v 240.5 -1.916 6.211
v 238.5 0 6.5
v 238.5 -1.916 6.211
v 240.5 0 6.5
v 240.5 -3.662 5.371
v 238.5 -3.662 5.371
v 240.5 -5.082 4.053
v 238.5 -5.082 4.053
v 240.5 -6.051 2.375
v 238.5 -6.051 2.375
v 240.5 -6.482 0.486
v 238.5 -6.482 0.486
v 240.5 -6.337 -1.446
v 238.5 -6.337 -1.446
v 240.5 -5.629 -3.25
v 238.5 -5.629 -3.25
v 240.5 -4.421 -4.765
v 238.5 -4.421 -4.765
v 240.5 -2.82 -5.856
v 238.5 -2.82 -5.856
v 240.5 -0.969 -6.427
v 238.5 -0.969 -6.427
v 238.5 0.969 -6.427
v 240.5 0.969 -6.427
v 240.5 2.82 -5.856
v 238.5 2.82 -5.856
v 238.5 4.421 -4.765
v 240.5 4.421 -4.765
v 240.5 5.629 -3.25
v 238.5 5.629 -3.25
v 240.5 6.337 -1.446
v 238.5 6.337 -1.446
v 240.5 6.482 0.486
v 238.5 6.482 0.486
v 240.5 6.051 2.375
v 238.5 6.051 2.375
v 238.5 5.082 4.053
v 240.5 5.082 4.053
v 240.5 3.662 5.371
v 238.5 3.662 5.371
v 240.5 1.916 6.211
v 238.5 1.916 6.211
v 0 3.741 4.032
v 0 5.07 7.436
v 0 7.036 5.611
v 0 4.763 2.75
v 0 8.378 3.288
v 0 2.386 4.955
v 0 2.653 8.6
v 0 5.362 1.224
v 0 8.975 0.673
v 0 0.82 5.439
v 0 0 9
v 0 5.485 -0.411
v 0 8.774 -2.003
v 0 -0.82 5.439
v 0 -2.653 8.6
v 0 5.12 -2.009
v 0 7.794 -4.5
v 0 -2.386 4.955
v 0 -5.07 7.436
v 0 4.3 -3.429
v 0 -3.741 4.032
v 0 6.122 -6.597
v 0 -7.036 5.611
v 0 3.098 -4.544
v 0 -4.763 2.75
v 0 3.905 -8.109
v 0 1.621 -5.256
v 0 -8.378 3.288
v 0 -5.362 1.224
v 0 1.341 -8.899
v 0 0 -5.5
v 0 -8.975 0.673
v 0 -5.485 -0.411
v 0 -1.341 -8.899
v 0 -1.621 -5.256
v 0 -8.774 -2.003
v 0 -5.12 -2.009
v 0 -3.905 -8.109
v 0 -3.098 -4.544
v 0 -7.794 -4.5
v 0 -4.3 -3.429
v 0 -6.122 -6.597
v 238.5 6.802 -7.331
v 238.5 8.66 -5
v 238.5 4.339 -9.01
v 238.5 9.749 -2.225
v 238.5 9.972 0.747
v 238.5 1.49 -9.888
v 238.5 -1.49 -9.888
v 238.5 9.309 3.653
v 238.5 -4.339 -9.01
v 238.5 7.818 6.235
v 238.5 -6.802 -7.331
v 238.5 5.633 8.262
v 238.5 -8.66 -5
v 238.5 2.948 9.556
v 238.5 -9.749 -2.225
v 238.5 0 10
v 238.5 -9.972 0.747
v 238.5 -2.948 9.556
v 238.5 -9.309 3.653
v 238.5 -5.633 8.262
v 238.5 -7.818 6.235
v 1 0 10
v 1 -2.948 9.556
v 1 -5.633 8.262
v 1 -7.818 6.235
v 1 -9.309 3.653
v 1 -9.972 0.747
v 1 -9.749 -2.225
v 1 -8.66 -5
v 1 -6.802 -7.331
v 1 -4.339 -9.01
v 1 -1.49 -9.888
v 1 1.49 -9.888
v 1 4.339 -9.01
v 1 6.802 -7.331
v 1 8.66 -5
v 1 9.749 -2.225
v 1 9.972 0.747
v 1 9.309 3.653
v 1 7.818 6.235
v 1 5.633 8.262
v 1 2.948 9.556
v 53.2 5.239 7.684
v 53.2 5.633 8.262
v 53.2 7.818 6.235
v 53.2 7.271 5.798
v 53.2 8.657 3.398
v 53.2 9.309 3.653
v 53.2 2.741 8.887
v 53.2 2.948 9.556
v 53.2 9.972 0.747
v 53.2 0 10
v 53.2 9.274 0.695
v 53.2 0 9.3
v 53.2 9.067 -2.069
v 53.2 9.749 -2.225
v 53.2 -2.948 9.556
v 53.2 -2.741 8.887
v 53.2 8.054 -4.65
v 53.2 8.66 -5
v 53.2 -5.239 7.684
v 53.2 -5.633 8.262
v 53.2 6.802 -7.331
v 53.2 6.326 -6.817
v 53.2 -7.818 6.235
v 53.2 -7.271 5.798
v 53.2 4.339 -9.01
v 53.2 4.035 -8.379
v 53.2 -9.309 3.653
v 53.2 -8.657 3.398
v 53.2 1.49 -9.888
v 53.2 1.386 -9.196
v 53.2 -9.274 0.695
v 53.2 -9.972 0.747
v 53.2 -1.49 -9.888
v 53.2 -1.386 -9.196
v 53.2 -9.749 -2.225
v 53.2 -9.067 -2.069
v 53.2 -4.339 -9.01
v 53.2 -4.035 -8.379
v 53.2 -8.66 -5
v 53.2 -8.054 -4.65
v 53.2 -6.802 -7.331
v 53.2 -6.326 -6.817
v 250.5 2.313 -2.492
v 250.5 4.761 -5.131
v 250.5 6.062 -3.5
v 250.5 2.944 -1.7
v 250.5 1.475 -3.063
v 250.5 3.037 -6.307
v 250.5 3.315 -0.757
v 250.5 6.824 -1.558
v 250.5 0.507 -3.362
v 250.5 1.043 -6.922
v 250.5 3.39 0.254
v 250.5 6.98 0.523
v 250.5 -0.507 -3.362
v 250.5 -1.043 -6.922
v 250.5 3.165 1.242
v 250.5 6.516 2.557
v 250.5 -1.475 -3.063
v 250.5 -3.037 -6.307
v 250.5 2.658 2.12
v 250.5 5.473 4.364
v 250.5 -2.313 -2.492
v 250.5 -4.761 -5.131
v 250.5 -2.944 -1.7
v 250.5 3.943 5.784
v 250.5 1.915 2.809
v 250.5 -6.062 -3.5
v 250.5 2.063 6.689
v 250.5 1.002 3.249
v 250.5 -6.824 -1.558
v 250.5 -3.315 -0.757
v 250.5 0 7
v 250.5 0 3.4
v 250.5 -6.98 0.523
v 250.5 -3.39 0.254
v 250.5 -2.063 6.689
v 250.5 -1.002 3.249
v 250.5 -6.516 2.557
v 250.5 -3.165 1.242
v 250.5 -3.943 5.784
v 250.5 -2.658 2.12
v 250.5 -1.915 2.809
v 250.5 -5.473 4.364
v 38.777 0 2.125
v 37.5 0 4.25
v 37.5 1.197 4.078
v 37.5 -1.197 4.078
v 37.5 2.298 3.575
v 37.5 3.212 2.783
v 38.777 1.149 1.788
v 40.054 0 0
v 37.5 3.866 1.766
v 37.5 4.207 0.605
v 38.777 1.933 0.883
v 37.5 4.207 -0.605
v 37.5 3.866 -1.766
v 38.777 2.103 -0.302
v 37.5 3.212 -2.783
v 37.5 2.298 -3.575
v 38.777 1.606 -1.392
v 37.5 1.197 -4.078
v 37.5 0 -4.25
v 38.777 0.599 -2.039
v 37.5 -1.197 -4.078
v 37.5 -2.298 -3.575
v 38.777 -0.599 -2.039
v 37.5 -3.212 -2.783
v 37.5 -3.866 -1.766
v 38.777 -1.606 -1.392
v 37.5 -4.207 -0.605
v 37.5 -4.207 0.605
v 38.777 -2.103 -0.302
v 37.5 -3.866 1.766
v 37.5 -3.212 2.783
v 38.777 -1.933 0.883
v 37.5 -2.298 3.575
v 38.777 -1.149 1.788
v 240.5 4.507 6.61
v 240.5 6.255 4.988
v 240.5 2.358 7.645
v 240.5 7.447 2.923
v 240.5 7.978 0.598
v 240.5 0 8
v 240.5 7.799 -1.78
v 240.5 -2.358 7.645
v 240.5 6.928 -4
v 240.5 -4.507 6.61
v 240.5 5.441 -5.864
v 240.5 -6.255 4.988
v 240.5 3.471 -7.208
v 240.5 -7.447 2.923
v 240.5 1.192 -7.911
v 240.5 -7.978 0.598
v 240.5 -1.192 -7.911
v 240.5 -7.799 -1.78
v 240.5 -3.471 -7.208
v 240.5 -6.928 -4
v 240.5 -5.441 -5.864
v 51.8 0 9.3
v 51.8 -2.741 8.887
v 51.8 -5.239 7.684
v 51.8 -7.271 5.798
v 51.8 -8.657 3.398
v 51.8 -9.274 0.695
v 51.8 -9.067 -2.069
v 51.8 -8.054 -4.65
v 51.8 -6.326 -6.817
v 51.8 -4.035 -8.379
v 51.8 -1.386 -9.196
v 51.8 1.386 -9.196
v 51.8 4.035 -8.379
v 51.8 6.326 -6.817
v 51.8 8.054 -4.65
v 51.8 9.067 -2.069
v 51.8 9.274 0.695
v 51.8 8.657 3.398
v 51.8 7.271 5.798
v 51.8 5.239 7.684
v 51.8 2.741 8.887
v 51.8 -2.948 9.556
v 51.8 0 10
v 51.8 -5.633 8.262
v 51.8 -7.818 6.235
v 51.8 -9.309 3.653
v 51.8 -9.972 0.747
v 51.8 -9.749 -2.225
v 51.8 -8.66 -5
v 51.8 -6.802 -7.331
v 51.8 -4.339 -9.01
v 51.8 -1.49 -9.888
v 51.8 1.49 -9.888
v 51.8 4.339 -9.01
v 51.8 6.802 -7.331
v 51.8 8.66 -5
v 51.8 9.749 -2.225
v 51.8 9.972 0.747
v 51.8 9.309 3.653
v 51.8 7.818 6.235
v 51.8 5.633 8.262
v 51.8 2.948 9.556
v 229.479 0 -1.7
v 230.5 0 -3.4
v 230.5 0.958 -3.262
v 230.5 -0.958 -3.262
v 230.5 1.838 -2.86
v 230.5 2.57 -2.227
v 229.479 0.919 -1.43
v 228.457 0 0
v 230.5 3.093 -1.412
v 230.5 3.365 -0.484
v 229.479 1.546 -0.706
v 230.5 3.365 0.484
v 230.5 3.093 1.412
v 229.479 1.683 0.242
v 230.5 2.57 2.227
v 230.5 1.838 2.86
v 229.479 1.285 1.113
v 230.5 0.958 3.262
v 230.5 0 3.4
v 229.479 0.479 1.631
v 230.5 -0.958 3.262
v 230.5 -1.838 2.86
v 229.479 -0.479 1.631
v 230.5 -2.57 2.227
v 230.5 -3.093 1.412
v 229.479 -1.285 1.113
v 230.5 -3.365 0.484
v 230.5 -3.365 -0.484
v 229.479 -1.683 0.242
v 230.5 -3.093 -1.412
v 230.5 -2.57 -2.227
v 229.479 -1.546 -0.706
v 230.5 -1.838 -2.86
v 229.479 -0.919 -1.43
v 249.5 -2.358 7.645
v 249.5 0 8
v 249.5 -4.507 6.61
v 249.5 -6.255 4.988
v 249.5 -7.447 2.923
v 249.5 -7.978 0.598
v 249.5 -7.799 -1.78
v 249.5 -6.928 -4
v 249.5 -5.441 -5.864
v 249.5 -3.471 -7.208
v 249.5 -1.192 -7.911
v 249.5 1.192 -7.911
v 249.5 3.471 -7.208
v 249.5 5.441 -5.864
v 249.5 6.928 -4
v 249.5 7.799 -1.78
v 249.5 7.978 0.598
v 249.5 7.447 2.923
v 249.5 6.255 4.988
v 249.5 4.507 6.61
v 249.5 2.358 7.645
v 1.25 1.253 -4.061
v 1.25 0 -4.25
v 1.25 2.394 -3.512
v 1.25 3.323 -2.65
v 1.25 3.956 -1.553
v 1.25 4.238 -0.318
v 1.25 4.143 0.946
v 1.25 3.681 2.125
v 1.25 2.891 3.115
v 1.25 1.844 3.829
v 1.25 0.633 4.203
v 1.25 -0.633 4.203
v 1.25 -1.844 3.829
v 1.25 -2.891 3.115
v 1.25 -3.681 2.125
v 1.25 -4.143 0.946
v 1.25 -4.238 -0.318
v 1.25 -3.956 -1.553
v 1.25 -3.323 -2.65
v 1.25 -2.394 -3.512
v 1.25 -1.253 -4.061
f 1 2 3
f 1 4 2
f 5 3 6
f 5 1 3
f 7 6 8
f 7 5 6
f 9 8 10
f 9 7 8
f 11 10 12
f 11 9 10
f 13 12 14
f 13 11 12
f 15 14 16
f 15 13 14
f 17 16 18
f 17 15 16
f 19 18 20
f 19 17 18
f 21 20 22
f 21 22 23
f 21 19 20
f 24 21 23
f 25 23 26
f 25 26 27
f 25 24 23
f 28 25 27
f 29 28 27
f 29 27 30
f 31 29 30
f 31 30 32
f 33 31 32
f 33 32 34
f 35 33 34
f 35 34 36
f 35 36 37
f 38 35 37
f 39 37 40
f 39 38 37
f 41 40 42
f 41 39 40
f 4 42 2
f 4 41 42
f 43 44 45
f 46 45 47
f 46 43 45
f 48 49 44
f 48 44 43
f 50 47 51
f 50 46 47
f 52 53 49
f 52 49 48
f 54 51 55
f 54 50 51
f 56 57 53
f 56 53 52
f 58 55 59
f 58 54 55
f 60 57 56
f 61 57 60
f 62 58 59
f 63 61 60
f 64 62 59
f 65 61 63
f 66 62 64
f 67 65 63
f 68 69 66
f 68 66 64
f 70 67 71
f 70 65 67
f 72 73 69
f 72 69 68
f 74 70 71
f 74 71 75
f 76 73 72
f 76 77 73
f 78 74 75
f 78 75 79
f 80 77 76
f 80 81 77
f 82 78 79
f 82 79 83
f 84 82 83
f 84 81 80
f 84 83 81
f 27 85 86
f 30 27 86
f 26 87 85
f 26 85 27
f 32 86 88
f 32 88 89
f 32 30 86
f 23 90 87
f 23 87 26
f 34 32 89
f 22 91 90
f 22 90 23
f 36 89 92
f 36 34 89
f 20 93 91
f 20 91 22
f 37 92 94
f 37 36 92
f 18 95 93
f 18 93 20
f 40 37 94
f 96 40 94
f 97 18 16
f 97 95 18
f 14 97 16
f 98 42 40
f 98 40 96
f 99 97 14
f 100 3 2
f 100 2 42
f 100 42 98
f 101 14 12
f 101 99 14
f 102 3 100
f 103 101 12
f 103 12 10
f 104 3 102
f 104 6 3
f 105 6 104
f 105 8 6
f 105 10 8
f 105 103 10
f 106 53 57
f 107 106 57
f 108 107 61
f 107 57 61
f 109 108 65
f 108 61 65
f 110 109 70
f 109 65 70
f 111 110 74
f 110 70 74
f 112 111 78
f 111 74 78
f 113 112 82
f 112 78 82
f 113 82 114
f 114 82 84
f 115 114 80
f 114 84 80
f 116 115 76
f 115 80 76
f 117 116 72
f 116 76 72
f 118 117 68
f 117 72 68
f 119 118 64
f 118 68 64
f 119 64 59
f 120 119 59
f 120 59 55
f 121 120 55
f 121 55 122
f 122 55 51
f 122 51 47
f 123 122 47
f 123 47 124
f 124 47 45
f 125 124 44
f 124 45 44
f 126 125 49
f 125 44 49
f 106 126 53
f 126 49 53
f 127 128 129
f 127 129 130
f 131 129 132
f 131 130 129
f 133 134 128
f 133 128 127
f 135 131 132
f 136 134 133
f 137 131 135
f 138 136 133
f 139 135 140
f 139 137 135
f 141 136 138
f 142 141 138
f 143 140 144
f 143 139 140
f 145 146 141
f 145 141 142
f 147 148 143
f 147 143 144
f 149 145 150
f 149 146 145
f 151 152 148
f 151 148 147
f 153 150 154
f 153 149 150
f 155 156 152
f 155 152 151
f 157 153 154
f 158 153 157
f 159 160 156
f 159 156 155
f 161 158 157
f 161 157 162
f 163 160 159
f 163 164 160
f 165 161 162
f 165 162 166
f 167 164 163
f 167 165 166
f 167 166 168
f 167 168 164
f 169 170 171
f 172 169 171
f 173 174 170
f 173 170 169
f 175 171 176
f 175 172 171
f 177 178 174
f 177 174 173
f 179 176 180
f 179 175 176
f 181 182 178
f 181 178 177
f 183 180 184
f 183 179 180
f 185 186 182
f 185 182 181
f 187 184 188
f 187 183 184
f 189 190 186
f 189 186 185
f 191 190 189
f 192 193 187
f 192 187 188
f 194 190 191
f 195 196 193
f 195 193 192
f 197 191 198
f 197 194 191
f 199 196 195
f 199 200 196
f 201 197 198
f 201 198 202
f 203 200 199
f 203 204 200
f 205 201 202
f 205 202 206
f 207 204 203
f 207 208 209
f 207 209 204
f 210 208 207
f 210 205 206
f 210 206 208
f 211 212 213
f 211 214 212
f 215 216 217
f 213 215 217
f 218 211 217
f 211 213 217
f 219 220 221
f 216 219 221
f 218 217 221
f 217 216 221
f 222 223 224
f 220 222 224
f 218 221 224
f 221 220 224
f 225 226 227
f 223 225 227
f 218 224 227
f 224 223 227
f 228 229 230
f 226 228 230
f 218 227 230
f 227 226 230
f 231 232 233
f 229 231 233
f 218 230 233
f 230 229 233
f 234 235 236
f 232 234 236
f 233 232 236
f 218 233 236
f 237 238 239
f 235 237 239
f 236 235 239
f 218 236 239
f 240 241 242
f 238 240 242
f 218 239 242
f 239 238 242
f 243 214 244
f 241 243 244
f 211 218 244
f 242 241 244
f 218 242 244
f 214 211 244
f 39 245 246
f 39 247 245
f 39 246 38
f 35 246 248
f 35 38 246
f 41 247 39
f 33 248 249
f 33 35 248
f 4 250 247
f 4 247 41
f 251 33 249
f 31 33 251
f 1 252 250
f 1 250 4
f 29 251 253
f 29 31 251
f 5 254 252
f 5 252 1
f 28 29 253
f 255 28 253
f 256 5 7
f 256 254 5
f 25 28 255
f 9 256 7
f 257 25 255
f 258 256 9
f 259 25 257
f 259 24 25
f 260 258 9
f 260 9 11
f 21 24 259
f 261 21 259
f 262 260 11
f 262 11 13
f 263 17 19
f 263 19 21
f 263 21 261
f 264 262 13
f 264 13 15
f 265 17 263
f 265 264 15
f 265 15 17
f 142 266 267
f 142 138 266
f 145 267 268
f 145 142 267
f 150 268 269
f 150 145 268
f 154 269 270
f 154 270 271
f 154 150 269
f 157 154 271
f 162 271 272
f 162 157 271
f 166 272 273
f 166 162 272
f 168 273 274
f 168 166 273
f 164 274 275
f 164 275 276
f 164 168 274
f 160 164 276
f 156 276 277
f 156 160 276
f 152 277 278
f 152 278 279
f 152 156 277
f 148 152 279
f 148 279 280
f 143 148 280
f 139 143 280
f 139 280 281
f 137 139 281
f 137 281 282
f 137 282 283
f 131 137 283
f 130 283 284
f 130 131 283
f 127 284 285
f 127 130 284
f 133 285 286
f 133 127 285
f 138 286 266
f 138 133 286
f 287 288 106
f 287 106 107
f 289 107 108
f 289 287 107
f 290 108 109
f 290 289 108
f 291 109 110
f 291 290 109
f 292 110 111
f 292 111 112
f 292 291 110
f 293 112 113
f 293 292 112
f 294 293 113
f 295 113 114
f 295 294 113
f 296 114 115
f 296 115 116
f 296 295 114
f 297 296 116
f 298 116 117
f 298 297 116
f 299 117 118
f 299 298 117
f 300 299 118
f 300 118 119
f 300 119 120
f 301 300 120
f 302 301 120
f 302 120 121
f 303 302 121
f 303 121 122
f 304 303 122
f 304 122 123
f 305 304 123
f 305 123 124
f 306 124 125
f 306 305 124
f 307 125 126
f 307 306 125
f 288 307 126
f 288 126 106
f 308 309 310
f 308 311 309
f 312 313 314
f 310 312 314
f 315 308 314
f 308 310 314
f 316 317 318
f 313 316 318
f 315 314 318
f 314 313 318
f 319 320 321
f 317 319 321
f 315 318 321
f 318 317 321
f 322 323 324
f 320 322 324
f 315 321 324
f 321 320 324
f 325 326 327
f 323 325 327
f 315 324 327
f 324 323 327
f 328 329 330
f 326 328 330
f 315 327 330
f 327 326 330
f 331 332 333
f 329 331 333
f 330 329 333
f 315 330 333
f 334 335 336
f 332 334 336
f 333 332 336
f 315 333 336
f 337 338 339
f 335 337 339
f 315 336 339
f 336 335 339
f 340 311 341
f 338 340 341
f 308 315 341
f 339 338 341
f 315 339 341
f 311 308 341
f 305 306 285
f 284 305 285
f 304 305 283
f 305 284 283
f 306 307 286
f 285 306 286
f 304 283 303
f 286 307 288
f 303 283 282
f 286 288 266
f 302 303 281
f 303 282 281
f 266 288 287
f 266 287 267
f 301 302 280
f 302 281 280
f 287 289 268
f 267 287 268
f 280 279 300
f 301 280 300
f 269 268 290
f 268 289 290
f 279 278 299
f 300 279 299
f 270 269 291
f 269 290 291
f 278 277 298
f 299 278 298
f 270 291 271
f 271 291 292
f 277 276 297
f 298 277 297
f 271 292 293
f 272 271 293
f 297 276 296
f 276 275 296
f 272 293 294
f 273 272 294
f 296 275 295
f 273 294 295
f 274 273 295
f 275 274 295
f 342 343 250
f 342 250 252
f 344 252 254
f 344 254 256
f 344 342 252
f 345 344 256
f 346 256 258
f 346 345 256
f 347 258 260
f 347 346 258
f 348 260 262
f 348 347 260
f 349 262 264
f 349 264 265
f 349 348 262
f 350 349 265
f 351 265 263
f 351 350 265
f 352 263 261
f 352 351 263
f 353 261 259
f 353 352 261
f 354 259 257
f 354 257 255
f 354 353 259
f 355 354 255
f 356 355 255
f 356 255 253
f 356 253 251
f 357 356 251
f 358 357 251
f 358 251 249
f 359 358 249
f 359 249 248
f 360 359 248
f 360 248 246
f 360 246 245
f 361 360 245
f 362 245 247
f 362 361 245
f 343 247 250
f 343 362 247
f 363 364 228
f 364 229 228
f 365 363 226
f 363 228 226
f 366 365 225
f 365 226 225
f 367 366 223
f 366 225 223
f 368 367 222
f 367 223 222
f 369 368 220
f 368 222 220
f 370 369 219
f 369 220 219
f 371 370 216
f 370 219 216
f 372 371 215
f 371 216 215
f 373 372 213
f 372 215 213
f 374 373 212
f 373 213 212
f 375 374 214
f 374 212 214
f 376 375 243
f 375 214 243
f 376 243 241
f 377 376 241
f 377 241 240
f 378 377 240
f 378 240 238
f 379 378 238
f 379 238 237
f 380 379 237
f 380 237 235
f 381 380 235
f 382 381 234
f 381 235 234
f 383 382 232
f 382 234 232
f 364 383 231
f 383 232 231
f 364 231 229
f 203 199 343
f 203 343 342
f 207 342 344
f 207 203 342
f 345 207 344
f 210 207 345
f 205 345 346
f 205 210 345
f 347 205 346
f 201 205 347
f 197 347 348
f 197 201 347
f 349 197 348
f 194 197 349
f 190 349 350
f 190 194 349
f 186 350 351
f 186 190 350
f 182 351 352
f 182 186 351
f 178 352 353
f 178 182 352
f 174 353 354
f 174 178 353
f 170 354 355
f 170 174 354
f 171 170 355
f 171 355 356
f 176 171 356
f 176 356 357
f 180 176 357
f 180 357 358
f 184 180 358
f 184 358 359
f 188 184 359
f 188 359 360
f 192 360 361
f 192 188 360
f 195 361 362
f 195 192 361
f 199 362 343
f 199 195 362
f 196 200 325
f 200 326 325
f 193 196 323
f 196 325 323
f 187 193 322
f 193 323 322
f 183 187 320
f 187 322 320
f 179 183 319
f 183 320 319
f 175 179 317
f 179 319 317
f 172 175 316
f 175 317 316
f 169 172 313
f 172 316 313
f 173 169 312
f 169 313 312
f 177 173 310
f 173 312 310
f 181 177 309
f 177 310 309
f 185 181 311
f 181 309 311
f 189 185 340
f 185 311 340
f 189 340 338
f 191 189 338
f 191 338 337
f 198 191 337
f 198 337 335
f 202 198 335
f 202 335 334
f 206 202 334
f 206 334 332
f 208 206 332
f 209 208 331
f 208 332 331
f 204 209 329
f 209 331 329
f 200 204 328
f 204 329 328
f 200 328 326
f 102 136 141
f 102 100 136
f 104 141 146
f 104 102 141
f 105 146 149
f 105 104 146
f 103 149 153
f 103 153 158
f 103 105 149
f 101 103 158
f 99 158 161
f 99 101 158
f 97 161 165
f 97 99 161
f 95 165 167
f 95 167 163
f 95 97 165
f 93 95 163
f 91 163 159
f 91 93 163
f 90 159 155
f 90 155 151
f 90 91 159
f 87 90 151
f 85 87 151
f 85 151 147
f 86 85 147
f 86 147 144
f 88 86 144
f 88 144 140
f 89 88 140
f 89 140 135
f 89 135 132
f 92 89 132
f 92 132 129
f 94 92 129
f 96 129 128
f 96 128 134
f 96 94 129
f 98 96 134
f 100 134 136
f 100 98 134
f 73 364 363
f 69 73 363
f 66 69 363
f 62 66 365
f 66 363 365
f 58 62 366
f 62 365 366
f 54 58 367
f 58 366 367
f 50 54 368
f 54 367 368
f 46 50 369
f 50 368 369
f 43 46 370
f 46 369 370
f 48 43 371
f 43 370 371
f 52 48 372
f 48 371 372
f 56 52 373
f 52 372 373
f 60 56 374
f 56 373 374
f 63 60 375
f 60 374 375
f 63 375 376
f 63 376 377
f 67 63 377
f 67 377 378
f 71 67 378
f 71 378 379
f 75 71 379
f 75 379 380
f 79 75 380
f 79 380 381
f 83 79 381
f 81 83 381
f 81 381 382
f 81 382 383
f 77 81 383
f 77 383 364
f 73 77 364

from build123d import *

# Parameters (mm, degrees)
M10X1_52_D            = 8.5
M10X1_52_DEPTH        = 37.5
M10X1_52_CSINK_D      = 11
M10X1_52_CSINK_ANGLE  = 90
M10X1_52_TIP          = 2.553657631
HOLE_WIZARD_M81_D     = 6.8
HOLE_WIZARD_M81_DEPTH = 20
HOLE_WIZARD_M81_TIP   = 2.042926105
SKETCH_6_W            = 2
SKETCH_6_H            = 1.5
SKETCH_20_W           = 1.4
SKETCH_20_H           = 0.7
CHAMFER_1_SIZE        = 1


with BuildPart() as part:
    # Эскиз1 → Повернуть1 (revolve)
    with BuildSketch(Plane.XY, mode=Mode.PRIVATE) as revolve_1_sk:
        Polygon((0, 10), (238.5, 10), (238.5, 8), (250.5, 8), (250.5, 0), (0, 0), align=None)
    revolve(revolve_1_sk.sketch.rotate(Axis((-123.335902371, 0, 0), (1, 0, 0)), 90), axis=Axis((-123.335902371, 0, 0), (1, 0, 0)))

    # Отверстие обработанное метчиком M10x1.52
    with Locations(Plane.ZY):
        with Locations((0, 0)):
            CounterSinkHole(M10X1_52_D / 2, M10X1_52_CSINK_D / 2, depth=M10X1_52_DEPTH, counter_sink_angle=M10X1_52_CSINK_ANGLE)
            with Locations((0, 0, -(M10X1_52_DEPTH + M10X1_52_TIP / 2))):  # 118° drill point
                Cone(0, M10X1_52_D / 2, M10X1_52_TIP, mode=Mode.SUBTRACT)

    # Отверстие обработанное метчиком M81
    with Locations(Plane(origin=(250.5, 0, 0), x_dir=(0, 0, -1), z_dir=(1, 0, 0))):
        with Locations((0, 0)):
            Hole(HOLE_WIZARD_M81_D / 2, depth=HOLE_WIZARD_M81_DEPTH)
            with Locations((0, 0, -(HOLE_WIZARD_M81_DEPTH + HOLE_WIZARD_M81_TIP / 2))):  # 118° drill point
                Cone(0, HOLE_WIZARD_M81_D / 2, HOLE_WIZARD_M81_TIP, mode=Mode.SUBTRACT)

    # Эскиз6 → Вырез-Повернуть1 (revolve, cut)
    with BuildSketch(Plane.XY, mode=Mode.PRIVATE) as cut_revolve_1_sk:
        with Locations((239.5, 7.25)):
            Rectangle(SKETCH_6_W, SKETCH_6_H)
    revolve(cut_revolve_1_sk.sketch.rotate(Axis((0, 0, 0), (1, 0, 0)), 90), axis=Axis((0, 0, 0), (1, 0, 0)), mode=Mode.SUBTRACT)

    # Эскиз20 → Вырез-Повернуть2 (revolve, cut)
    with BuildSketch(Plane.XY, mode=Mode.PRIVATE) as cut_revolve_2_sk:
        with Locations((52.5, 9.65)):
            Rectangle(SKETCH_20_W, SKETCH_20_H)
    revolve(cut_revolve_2_sk.sketch.rotate(Axis((0, 0, 0), (1, 0, 0)), 90), axis=Axis((0, 0, 0), (1, 0, 0)), mode=Mode.SUBTRACT)

    # Фаска1
    chamfer_1_edges = [part.edges().sort_by_distance(p)[0] for p in [
        (250.5, 0, -8),
        (0, 0, -10),
    ]]
    chamfer(chamfer_1_edges, length=CHAMFER_1_SIZE)


solid = part.part
